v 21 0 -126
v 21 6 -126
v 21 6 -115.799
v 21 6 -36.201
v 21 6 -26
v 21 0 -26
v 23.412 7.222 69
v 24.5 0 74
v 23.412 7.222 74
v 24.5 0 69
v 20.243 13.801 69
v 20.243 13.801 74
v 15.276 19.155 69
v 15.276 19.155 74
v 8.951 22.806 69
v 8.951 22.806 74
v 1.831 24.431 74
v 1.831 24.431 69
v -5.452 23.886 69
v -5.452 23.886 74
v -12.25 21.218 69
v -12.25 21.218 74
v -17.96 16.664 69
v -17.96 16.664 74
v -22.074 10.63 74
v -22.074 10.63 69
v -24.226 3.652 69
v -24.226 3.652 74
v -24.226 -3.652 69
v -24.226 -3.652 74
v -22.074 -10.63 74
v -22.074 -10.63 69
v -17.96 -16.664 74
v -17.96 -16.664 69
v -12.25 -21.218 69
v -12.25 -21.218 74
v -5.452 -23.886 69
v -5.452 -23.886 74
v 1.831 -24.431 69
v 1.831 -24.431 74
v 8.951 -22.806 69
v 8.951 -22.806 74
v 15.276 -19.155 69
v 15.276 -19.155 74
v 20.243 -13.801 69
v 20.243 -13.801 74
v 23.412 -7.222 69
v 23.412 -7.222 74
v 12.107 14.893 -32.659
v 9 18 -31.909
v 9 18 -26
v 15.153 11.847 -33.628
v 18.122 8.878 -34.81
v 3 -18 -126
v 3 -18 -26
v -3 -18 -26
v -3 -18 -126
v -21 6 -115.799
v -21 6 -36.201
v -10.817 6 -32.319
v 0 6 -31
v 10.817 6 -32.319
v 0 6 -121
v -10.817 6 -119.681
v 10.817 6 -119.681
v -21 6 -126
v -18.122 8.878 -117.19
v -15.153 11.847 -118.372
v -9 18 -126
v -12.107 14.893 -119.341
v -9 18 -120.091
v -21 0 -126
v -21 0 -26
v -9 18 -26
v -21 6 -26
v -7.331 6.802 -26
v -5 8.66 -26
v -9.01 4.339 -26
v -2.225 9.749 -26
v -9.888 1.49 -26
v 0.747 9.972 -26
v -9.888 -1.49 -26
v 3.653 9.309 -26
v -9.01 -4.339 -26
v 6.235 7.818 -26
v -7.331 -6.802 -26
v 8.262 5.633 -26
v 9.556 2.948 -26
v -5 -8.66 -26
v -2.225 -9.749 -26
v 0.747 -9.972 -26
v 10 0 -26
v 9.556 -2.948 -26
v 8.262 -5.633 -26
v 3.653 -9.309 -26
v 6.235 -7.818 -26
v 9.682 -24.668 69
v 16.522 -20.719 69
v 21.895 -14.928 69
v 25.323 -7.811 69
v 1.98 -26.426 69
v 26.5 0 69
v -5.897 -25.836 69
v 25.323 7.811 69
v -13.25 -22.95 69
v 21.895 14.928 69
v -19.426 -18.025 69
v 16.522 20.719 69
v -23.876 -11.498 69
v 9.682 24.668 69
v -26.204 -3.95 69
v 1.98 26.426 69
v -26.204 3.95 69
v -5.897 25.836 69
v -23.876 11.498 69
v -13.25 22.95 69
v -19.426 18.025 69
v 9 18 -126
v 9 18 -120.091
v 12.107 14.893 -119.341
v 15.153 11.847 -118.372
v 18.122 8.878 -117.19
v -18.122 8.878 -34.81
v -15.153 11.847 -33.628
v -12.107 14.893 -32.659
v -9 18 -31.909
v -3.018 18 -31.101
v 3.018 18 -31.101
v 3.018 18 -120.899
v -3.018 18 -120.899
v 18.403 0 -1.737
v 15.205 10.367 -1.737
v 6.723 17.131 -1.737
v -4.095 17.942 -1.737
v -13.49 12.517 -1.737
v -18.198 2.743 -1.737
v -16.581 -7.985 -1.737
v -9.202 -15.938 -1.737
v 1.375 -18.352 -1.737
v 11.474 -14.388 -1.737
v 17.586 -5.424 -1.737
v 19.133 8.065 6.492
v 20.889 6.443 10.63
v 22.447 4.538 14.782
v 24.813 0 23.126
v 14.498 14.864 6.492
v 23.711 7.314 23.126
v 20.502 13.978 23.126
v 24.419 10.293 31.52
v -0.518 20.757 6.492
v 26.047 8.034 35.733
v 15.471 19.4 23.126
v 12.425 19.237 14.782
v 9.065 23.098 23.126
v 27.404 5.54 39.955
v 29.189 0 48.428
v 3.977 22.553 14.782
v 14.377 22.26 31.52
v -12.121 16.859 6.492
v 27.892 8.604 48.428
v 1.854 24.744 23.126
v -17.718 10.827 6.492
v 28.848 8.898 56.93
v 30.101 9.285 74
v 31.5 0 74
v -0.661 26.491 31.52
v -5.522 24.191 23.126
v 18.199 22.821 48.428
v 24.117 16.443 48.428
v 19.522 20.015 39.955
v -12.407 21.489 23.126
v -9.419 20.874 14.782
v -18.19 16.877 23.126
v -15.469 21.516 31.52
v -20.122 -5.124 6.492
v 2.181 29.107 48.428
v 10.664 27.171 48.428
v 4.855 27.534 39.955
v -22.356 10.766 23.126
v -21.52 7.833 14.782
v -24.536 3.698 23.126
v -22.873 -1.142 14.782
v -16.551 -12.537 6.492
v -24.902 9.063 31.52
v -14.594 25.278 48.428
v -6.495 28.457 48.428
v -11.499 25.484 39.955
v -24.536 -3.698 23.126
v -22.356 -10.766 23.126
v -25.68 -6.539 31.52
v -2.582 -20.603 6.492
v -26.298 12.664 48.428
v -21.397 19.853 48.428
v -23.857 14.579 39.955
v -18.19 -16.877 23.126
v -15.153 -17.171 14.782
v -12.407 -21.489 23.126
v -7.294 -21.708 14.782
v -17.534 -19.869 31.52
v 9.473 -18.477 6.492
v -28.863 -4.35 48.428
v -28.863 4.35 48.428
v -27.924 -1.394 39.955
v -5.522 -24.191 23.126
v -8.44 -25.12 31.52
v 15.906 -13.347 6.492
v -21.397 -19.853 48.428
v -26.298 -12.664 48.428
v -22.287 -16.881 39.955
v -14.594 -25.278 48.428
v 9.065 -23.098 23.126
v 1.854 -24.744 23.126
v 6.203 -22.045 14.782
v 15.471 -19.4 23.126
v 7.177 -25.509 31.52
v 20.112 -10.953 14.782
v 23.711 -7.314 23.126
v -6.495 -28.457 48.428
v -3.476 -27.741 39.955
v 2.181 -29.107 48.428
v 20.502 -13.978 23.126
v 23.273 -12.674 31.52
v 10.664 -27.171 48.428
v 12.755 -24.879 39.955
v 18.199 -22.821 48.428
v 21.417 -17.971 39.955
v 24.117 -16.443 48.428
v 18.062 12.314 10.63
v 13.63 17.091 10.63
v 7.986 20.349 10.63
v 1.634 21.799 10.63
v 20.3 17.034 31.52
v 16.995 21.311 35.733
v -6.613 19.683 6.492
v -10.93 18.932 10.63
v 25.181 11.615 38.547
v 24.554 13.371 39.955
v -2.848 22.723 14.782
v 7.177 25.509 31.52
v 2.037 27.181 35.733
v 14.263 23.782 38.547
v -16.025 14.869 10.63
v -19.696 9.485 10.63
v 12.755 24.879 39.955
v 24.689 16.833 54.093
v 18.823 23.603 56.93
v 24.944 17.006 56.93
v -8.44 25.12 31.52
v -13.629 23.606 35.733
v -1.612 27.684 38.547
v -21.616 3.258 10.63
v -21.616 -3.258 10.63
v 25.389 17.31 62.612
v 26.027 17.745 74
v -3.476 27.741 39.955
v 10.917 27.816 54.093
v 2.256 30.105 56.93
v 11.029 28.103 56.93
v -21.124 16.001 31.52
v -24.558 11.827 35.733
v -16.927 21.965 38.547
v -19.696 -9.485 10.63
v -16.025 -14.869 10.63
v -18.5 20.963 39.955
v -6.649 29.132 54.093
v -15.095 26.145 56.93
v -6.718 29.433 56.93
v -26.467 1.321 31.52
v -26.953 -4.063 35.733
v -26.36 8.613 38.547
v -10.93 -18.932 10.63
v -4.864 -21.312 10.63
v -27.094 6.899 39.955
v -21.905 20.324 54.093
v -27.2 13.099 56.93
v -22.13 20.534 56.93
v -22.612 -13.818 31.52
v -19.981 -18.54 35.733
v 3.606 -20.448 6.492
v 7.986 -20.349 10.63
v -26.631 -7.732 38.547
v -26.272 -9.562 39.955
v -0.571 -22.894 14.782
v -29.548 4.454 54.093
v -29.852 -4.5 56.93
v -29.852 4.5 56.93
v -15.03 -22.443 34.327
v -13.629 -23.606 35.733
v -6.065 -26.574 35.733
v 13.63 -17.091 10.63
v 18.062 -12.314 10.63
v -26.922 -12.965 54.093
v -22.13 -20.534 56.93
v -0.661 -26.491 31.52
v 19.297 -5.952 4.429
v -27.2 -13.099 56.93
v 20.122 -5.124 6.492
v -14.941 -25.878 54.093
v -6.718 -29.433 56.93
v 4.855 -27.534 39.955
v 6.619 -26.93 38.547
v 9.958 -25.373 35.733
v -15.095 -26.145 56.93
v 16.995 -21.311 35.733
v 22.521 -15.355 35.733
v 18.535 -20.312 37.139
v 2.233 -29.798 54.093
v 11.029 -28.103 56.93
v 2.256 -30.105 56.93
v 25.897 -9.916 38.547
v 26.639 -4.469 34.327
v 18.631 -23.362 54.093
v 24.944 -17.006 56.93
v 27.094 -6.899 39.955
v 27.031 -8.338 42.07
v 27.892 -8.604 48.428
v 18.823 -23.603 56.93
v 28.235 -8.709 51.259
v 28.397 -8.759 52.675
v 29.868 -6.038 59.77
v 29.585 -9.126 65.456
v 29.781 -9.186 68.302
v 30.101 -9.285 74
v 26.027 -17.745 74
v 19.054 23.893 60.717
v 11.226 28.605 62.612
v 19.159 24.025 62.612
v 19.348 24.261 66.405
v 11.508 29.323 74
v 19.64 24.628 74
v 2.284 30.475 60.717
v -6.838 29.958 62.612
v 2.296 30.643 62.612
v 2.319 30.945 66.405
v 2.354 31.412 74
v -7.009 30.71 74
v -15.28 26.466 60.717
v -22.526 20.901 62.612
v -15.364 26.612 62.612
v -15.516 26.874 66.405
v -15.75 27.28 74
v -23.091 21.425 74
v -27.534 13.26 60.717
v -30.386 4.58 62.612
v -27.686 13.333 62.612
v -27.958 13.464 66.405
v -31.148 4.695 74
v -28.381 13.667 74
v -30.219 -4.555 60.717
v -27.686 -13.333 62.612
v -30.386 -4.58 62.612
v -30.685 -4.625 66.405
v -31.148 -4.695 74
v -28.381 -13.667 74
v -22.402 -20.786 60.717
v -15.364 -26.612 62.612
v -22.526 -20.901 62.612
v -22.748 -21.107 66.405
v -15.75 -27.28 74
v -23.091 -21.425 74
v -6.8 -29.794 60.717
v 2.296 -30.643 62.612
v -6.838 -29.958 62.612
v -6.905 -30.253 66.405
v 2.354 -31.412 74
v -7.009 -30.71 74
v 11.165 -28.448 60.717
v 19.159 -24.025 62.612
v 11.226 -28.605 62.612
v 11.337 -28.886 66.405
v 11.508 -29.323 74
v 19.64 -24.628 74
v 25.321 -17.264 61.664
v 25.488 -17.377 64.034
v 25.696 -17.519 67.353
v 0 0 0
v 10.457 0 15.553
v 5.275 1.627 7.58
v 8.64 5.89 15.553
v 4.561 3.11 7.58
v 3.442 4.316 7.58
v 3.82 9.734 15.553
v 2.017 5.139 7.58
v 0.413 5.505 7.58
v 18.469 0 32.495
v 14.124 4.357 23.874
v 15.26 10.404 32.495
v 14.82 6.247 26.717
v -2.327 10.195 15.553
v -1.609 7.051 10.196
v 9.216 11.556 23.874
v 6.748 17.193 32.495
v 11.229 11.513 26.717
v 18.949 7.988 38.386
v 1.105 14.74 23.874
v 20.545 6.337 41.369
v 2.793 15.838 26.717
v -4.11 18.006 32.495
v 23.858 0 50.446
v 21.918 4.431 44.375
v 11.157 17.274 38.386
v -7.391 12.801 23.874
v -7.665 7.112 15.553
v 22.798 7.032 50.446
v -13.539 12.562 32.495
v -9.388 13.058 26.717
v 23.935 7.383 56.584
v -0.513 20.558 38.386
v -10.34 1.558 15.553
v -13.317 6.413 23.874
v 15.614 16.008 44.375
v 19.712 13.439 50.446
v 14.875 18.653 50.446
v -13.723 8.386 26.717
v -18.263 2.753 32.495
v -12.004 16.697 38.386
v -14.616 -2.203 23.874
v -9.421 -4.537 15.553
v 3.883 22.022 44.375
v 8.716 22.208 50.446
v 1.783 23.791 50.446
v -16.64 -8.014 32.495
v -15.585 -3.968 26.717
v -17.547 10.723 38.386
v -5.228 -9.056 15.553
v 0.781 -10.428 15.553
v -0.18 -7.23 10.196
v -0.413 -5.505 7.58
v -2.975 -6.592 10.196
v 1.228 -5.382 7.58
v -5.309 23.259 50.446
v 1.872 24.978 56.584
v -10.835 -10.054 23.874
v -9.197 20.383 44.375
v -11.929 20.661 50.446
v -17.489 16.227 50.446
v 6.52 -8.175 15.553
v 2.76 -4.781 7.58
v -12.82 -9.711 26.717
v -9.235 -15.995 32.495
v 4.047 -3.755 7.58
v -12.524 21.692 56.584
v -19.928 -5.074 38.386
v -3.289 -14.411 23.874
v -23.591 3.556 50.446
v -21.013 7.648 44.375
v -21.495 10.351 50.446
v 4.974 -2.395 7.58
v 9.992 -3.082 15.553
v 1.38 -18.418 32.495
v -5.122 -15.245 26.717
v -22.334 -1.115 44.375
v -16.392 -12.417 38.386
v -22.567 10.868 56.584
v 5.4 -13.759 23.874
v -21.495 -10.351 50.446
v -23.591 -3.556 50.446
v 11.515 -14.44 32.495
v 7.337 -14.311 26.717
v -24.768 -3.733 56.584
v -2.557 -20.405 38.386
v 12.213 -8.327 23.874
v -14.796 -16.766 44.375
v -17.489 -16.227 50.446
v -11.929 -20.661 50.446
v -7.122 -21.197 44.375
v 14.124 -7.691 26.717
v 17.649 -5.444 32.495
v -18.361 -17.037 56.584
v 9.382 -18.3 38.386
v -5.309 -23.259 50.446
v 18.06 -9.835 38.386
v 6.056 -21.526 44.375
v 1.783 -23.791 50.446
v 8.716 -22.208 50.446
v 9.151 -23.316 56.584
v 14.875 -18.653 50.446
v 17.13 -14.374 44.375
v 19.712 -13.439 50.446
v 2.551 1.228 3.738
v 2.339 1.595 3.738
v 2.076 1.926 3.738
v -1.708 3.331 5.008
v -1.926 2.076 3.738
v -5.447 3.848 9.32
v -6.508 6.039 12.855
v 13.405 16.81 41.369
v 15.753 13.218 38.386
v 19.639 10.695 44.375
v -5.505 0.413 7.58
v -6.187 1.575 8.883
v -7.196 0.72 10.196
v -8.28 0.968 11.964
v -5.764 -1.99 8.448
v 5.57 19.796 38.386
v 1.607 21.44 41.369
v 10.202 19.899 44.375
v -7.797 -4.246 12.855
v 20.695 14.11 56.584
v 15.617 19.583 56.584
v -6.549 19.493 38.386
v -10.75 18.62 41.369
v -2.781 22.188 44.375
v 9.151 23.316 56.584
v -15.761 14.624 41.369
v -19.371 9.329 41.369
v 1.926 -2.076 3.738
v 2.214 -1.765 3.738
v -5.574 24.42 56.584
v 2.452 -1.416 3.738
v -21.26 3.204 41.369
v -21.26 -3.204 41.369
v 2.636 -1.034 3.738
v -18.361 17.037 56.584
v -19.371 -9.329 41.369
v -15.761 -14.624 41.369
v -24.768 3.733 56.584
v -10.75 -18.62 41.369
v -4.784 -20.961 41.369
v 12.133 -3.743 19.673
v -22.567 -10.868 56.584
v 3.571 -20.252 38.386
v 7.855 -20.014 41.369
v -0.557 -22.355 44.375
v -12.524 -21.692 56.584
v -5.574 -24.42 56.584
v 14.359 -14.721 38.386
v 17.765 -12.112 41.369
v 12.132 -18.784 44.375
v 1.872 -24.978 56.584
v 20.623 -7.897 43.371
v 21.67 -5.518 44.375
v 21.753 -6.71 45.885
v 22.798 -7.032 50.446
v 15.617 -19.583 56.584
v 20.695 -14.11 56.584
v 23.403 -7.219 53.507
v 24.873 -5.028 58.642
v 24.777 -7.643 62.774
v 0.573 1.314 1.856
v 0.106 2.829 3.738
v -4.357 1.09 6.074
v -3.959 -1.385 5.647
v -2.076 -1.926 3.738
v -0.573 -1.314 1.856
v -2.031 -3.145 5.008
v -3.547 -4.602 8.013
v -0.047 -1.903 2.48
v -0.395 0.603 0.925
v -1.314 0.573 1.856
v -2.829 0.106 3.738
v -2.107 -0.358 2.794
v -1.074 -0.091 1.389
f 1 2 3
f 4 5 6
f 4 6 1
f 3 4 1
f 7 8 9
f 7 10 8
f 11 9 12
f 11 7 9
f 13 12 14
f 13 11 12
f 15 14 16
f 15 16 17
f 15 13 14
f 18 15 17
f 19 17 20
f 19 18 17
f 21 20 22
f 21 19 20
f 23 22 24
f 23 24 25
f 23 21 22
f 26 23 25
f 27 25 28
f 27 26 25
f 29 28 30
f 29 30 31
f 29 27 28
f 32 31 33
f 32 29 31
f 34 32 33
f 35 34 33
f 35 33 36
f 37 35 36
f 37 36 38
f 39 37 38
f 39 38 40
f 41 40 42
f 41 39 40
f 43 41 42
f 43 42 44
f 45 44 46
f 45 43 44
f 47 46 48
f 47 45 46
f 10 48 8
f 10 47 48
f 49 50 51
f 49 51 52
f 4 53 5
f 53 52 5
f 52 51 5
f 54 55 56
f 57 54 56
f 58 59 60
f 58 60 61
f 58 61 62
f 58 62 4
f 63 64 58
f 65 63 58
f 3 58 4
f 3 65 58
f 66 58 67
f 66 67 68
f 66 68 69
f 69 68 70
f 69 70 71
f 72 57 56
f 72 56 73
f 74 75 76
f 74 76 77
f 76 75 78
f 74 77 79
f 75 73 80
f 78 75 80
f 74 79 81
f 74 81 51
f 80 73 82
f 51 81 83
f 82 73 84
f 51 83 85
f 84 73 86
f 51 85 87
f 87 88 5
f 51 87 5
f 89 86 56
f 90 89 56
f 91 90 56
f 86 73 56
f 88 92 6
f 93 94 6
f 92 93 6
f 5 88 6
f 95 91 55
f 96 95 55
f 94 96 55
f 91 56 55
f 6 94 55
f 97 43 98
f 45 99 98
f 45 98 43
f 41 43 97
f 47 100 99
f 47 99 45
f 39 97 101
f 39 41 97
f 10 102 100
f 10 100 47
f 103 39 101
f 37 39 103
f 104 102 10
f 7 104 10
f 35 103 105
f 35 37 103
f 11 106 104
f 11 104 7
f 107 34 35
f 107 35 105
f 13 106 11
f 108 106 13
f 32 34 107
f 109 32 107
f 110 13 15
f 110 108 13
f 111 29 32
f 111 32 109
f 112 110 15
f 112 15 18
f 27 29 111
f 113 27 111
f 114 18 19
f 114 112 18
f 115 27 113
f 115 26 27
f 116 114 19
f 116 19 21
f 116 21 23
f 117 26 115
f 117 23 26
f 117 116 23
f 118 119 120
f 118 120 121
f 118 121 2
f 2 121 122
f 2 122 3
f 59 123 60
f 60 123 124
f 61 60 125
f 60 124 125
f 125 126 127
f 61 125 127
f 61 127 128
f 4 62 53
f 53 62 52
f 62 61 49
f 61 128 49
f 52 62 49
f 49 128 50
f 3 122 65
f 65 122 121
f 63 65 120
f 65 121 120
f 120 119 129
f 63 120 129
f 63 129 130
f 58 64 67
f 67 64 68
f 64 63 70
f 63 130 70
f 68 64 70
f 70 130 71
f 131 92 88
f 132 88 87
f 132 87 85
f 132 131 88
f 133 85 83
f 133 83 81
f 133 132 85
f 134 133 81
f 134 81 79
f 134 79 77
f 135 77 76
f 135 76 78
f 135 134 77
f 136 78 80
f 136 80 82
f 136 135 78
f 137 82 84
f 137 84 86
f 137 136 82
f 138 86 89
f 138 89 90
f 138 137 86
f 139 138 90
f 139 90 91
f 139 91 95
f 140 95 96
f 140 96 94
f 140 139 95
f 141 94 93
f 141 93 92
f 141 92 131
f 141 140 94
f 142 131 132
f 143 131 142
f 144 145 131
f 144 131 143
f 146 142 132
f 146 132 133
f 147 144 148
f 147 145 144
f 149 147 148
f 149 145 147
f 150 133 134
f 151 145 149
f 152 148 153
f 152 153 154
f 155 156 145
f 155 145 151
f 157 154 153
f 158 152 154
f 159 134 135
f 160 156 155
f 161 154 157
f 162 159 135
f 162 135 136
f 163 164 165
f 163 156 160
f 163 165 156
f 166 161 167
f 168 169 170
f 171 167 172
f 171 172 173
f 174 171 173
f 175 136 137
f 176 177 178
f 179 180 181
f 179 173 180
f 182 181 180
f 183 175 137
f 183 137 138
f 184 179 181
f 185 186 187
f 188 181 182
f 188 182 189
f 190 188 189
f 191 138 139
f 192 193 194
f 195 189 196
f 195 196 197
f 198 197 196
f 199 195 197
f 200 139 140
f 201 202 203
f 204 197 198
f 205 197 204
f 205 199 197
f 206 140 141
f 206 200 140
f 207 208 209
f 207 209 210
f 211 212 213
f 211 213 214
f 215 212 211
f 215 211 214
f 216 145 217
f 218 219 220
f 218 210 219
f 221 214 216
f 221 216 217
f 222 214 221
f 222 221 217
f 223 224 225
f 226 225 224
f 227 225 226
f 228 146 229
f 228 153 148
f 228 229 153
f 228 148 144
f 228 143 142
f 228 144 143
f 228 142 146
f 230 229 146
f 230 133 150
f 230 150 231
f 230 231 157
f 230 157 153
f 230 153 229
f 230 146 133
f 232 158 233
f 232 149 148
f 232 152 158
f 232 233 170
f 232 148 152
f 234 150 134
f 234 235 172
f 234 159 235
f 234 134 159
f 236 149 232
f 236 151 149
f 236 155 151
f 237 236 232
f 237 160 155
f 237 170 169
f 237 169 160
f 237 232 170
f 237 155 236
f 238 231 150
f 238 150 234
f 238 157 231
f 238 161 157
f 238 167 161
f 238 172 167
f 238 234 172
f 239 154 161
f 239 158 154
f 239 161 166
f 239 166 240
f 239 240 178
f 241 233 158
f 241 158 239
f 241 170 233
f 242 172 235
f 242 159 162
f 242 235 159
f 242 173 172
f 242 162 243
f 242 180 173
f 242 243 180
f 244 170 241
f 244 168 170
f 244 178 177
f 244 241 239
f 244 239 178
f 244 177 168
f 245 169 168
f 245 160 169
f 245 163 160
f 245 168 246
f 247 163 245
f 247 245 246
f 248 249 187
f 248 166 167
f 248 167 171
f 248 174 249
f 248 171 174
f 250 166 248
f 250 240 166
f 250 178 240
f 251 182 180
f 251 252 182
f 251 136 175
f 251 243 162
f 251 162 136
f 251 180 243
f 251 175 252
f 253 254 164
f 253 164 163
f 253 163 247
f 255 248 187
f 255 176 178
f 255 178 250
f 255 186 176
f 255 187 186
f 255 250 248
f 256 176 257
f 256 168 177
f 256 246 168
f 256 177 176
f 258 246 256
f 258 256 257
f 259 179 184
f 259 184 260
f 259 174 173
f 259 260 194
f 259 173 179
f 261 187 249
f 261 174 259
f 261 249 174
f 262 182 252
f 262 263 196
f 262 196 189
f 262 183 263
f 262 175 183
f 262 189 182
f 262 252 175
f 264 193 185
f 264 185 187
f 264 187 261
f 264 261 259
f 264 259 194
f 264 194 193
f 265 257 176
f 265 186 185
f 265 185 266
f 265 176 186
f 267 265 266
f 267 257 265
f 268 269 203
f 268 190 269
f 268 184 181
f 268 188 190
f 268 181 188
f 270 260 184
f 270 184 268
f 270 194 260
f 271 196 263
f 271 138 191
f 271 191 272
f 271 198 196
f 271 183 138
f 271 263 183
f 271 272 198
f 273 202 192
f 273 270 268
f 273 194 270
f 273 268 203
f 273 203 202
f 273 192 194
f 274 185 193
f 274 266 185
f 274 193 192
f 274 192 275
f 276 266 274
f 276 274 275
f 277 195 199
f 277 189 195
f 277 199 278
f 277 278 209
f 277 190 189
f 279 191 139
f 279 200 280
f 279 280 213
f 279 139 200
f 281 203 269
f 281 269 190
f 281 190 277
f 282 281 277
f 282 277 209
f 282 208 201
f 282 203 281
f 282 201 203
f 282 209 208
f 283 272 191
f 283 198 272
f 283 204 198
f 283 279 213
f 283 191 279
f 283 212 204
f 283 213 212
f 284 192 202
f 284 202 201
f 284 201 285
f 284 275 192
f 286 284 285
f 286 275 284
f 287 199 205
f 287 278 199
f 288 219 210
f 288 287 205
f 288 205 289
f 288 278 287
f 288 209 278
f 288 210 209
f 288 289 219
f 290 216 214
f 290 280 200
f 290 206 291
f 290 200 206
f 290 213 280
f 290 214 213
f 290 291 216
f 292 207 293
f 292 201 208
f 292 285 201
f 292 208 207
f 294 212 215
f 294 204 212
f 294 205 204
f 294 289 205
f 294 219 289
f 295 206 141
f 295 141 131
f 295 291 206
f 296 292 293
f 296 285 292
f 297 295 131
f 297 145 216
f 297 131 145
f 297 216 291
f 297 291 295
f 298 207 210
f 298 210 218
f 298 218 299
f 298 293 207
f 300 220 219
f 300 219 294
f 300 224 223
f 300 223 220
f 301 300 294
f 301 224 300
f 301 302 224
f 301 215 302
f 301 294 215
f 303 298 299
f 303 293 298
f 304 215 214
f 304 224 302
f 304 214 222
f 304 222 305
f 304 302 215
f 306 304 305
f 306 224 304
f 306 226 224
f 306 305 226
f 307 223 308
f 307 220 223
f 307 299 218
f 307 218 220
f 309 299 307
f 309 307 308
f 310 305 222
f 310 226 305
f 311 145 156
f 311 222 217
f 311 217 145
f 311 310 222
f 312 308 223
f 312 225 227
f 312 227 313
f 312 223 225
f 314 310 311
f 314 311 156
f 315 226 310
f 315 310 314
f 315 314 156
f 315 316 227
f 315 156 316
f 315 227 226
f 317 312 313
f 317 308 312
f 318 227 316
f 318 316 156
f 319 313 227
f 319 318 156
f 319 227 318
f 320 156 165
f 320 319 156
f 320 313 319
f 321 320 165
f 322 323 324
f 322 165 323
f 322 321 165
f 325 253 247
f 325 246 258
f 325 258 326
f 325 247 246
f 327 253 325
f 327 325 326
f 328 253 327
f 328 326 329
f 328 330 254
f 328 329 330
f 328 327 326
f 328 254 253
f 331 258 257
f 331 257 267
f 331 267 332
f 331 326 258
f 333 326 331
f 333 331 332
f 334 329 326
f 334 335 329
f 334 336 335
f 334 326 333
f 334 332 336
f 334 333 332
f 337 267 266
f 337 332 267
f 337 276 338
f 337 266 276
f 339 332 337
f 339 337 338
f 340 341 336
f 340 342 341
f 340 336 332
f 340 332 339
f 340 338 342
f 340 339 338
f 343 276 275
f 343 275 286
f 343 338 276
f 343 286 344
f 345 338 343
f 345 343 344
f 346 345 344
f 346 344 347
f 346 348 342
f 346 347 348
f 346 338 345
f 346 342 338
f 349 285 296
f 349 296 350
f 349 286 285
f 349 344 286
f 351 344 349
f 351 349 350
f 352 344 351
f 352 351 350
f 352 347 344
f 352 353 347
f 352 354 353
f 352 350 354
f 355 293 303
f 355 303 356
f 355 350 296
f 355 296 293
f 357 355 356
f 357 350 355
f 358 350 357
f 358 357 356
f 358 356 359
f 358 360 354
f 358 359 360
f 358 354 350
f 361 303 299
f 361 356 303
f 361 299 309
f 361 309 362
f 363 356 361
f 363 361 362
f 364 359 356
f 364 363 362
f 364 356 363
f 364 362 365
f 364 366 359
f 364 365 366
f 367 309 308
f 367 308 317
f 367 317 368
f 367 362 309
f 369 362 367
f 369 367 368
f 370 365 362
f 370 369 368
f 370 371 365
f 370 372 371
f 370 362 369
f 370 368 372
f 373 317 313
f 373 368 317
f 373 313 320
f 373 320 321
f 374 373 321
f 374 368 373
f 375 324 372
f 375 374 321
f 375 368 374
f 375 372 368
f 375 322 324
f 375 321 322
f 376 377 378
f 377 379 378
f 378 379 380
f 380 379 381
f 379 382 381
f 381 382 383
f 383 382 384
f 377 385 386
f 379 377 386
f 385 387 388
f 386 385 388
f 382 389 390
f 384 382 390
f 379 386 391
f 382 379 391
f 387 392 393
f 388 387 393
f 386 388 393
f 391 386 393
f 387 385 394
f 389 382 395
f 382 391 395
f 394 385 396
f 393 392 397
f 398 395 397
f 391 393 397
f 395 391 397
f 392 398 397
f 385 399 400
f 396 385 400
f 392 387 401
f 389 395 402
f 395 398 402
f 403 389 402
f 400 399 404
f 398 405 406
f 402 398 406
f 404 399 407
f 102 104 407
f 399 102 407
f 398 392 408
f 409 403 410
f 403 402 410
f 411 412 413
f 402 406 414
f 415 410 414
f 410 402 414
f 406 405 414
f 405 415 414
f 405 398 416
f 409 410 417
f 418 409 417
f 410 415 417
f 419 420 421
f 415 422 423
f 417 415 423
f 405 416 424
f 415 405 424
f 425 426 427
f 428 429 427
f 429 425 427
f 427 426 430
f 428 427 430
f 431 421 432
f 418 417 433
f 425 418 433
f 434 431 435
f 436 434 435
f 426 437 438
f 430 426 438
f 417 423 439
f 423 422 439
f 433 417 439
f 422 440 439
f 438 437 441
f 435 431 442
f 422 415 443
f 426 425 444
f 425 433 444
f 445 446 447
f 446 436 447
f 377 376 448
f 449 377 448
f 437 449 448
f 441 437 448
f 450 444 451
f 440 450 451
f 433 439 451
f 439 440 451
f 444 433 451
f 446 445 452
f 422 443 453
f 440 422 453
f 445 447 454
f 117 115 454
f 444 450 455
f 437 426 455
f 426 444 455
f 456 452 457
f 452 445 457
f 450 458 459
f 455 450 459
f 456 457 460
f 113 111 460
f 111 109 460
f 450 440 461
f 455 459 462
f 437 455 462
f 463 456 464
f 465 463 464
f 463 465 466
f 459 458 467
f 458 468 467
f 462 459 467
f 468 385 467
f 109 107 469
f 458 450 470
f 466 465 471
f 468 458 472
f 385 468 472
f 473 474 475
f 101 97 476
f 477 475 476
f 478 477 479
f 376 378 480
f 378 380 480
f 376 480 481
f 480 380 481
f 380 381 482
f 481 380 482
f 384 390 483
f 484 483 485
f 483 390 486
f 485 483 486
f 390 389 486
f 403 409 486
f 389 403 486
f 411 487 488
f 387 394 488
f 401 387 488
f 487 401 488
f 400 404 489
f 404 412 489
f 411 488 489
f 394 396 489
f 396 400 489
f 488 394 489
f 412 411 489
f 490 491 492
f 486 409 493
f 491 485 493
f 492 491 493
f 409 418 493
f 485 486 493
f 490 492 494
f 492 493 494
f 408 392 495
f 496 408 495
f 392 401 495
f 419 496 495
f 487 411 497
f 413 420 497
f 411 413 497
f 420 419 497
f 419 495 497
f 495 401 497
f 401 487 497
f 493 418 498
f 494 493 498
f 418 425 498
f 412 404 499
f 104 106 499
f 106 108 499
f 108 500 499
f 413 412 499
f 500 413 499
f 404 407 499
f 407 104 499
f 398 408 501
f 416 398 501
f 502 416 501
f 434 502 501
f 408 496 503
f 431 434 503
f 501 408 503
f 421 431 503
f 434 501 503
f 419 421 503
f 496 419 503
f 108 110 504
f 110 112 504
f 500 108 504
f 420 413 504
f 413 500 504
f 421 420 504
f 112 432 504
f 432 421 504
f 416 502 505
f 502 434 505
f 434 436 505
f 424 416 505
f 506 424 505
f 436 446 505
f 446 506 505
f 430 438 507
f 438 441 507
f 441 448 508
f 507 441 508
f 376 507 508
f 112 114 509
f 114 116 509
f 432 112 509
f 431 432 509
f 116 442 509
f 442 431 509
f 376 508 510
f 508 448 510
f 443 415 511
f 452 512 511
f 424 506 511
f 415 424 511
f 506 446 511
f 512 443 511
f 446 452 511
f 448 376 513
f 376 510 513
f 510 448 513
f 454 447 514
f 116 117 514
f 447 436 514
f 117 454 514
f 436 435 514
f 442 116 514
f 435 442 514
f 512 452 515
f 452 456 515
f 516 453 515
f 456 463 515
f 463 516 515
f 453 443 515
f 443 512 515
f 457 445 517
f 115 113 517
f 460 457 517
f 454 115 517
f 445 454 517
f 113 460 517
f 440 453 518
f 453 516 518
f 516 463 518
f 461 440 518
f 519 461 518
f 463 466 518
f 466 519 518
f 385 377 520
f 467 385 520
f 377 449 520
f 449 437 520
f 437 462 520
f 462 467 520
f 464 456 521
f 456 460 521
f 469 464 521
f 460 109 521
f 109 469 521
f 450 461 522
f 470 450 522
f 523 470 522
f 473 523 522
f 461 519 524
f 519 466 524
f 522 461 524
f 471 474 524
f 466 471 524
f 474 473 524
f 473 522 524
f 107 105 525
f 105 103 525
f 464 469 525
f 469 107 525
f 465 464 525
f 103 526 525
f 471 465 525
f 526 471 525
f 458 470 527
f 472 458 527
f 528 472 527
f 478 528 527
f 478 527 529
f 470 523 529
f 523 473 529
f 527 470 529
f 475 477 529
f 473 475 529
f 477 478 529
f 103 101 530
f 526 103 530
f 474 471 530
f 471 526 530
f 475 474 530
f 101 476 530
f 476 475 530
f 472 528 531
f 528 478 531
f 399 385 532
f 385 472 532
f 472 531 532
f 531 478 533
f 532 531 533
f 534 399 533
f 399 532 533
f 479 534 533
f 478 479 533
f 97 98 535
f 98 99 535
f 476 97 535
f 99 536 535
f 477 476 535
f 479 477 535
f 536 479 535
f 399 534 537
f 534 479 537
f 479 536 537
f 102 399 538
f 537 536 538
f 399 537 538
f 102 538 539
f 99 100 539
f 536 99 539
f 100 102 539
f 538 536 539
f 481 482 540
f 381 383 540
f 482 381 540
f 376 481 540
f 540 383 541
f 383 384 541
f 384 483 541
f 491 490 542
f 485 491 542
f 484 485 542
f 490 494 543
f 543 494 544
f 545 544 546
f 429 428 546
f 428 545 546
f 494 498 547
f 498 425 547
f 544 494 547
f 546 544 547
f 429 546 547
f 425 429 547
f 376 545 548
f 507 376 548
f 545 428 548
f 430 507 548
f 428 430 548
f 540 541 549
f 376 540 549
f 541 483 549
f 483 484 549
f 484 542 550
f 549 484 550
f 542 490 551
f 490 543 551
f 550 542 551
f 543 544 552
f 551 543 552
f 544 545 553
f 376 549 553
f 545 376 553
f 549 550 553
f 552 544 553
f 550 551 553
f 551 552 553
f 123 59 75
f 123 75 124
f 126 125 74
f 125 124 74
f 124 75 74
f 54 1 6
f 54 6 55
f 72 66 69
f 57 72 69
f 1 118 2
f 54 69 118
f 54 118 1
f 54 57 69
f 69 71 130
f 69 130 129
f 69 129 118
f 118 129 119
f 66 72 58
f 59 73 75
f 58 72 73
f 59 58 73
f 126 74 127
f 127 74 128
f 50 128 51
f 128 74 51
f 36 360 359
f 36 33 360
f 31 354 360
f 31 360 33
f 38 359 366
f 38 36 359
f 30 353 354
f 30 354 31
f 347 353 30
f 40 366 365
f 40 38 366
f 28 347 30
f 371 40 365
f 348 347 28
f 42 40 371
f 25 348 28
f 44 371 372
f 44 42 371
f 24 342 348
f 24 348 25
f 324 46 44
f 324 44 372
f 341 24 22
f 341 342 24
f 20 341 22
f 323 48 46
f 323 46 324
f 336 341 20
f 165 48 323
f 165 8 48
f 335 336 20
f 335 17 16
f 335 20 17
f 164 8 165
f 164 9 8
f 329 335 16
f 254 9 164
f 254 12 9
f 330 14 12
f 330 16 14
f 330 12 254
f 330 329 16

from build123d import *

# Parameters (mm, degrees)
PAD_DEPTH   = 100
SKETCH002_R = 45
HOLE_DEPTH  = 12


with BuildPart() as part:
    # Sketch → Revolution (revolve)
    with BuildSketch(Plane.XZ):
        with BuildLine():
            ThreePointArc((10, 0), (24.813455, 49.126357), (31.5, 100))
            Line((31.5, 100), (24.5, 100))
            Line((24.5, 100), (24.5, 95))
            Line((24.5, 95), (26.5, 95))
            ThreePointArc((0, 26), (18.469352, 58.495466), (26.5, 95))
            Line((0, 26), (0, 0))
            Line((0, 0), (10, 0))
        make_face()
    revolve(axis=Axis((0, 0, 0), (0, 0, 1)))

    # Sketch001 (on Face1 of Revolution) → Pad (new body)
    with BuildSketch(Plane(origin=(0, 0, 0), x_dir=(1, 0, 0), z_dir=(0, 0, -1))):
        Polygon((-3, 18), (-21, 0), (-21, -6), (-9, -18), (9, -18), (21, -6), (21, 0), (3, 18), align=None)
    extrude(amount=PAD_DEPTH)

    # Sketch002 (on Face9 of Pad) → Hole (cut)
    with BuildSketch(Plane(origin=(0, 18, 0), x_dir=(1, 0, 0), z_dir=(0, 1, 0))):
        with Locations((0, 50)):
            Circle(SKETCH002_R)
    extrude(amount=-HOLE_DEPTH, mode=Mode.SUBTRACT)


with BuildPart() as part_1:
    # Body placement: moved
    add(part.part.moved(Location((0, 0, -26))))


solid = part_1.part
